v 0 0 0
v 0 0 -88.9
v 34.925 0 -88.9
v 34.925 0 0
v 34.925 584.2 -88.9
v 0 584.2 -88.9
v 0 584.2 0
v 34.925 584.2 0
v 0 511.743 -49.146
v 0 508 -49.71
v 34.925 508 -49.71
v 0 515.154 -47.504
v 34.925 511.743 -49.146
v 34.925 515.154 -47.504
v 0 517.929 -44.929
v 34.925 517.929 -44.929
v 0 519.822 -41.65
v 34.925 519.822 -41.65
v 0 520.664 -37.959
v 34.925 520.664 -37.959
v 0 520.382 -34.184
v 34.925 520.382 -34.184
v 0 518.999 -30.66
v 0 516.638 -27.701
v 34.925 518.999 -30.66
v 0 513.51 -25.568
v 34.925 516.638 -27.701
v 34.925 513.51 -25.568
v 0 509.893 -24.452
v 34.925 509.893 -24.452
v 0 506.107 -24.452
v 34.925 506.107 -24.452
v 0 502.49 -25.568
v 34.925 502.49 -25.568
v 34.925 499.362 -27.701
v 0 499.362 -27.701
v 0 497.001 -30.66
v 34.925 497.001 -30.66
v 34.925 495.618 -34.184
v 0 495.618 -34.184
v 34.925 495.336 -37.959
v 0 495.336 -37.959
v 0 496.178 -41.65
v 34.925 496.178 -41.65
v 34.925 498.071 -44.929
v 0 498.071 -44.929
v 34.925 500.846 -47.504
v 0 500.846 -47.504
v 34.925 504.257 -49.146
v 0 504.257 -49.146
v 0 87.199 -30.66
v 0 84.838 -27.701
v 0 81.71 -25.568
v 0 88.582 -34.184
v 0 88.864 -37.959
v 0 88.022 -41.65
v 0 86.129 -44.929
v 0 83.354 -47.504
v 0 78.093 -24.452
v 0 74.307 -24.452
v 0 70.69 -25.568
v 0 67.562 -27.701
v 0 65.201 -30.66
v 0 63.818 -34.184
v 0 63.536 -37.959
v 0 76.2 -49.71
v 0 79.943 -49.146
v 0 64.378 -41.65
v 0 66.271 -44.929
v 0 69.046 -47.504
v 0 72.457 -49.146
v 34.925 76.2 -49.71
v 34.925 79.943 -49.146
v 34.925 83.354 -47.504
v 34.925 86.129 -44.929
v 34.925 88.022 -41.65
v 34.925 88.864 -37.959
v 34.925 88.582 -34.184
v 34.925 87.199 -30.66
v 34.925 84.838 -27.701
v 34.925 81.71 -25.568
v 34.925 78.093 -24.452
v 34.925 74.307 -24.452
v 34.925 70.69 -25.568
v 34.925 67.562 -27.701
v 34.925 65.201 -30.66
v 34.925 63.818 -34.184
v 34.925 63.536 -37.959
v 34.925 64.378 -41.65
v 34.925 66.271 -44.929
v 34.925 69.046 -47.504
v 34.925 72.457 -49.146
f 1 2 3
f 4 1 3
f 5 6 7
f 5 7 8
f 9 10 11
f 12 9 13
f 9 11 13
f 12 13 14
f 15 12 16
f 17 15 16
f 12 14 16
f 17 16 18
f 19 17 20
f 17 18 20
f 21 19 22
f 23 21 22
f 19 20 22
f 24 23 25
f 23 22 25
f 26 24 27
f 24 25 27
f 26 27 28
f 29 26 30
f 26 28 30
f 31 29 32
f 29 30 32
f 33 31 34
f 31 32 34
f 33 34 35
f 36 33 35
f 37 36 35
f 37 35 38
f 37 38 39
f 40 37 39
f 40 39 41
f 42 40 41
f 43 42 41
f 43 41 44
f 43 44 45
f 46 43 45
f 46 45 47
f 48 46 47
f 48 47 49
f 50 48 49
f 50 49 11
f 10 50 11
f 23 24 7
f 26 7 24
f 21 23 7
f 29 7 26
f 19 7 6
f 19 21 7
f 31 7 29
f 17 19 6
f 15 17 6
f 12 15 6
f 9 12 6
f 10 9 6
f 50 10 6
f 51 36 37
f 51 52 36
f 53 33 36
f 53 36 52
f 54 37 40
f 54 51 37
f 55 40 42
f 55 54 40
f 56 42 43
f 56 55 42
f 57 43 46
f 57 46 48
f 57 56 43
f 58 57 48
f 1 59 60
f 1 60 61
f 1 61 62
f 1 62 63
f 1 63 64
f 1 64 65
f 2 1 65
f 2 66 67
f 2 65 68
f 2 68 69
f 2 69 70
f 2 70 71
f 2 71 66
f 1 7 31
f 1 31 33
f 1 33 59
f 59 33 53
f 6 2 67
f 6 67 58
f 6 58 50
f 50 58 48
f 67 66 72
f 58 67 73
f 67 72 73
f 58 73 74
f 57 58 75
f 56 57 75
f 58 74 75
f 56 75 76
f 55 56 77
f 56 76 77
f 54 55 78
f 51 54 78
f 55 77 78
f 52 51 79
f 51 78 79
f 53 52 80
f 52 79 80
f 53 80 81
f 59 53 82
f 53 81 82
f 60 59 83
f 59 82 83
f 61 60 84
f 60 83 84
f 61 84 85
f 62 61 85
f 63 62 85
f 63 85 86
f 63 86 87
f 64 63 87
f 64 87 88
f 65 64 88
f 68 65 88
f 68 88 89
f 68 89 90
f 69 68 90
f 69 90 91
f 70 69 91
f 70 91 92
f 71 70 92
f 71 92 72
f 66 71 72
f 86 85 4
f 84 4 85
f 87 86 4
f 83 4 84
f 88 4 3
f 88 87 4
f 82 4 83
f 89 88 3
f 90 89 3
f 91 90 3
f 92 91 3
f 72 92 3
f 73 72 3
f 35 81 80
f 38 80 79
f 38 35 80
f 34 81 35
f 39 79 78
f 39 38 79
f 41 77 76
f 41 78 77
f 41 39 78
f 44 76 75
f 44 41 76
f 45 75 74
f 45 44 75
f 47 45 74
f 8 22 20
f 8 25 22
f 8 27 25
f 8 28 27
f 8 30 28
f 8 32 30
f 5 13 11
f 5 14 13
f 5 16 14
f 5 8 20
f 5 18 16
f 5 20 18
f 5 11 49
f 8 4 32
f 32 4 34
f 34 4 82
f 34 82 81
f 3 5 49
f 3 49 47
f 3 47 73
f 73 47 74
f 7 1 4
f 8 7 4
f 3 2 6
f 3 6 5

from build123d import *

# Parameters (mm, degrees)
SKETCH1_W           = 38.1
SKETCH1_H           = 88.9
BOSS_EXTRUDE1_DEPTH = 584.2
SKETCH2_R           = 12.7
CUT_EXTRUDE1_DEPTH  = 593.152395925
SKETCH2_3_W         = 88.9
SKETCH2_3_H         = 584.2
SKETCH2_3_R         = 12.7
CUT_EXTRUDE2_DEPTH  = 3.175


with BuildPart() as part:
    # Sketch1 → Boss-Extrude1 (new body)
    with BuildSketch(Plane(origin=(0, 0, 0), x_dir=(1, 0, 0), z_dir=(0, 1, 0))):
        with Locations((19.05, 44.45)):
            Rectangle(SKETCH1_W, SKETCH1_H)
    extrude(amount=BOSS_EXTRUDE1_DEPTH)

    # Sketch2 → Cut-Extrude1 (cut, through all)
    with BuildSketch(Plane(origin=(38.1, 0, 0), x_dir=(0, 0, -1), z_dir=(1, 0, 0))):
        with Locations((37.01034, 76.2)):
            Circle(SKETCH2_R)
        with Locations((37.01034, 508)):
            Circle(SKETCH2_R)
    extrude(amount=-CUT_EXTRUDE1_DEPTH, mode=Mode.SUBTRACT)

    # Sketch2<3> → Cut-Extrude2 (cut)
    with BuildSketch(Plane(origin=(38.1, 0, 0), x_dir=(0, 0, -1), z_dir=(1, 0, 0))):
        with Locations((44.45, 292.1)):
            Rectangle(SKETCH2_3_W, SKETCH2_3_H)
        with Locations((37.01034, 76.2)):
            Circle(SKETCH2_3_R, mode=Mode.SUBTRACT)
        with Locations((37.01034, 508)):
            Circle(SKETCH2_3_R, mode=Mode.SUBTRACT)
    extrude(amount=-CUT_EXTRUDE2_DEPTH, mode=Mode.SUBTRACT)


solid = part.part
